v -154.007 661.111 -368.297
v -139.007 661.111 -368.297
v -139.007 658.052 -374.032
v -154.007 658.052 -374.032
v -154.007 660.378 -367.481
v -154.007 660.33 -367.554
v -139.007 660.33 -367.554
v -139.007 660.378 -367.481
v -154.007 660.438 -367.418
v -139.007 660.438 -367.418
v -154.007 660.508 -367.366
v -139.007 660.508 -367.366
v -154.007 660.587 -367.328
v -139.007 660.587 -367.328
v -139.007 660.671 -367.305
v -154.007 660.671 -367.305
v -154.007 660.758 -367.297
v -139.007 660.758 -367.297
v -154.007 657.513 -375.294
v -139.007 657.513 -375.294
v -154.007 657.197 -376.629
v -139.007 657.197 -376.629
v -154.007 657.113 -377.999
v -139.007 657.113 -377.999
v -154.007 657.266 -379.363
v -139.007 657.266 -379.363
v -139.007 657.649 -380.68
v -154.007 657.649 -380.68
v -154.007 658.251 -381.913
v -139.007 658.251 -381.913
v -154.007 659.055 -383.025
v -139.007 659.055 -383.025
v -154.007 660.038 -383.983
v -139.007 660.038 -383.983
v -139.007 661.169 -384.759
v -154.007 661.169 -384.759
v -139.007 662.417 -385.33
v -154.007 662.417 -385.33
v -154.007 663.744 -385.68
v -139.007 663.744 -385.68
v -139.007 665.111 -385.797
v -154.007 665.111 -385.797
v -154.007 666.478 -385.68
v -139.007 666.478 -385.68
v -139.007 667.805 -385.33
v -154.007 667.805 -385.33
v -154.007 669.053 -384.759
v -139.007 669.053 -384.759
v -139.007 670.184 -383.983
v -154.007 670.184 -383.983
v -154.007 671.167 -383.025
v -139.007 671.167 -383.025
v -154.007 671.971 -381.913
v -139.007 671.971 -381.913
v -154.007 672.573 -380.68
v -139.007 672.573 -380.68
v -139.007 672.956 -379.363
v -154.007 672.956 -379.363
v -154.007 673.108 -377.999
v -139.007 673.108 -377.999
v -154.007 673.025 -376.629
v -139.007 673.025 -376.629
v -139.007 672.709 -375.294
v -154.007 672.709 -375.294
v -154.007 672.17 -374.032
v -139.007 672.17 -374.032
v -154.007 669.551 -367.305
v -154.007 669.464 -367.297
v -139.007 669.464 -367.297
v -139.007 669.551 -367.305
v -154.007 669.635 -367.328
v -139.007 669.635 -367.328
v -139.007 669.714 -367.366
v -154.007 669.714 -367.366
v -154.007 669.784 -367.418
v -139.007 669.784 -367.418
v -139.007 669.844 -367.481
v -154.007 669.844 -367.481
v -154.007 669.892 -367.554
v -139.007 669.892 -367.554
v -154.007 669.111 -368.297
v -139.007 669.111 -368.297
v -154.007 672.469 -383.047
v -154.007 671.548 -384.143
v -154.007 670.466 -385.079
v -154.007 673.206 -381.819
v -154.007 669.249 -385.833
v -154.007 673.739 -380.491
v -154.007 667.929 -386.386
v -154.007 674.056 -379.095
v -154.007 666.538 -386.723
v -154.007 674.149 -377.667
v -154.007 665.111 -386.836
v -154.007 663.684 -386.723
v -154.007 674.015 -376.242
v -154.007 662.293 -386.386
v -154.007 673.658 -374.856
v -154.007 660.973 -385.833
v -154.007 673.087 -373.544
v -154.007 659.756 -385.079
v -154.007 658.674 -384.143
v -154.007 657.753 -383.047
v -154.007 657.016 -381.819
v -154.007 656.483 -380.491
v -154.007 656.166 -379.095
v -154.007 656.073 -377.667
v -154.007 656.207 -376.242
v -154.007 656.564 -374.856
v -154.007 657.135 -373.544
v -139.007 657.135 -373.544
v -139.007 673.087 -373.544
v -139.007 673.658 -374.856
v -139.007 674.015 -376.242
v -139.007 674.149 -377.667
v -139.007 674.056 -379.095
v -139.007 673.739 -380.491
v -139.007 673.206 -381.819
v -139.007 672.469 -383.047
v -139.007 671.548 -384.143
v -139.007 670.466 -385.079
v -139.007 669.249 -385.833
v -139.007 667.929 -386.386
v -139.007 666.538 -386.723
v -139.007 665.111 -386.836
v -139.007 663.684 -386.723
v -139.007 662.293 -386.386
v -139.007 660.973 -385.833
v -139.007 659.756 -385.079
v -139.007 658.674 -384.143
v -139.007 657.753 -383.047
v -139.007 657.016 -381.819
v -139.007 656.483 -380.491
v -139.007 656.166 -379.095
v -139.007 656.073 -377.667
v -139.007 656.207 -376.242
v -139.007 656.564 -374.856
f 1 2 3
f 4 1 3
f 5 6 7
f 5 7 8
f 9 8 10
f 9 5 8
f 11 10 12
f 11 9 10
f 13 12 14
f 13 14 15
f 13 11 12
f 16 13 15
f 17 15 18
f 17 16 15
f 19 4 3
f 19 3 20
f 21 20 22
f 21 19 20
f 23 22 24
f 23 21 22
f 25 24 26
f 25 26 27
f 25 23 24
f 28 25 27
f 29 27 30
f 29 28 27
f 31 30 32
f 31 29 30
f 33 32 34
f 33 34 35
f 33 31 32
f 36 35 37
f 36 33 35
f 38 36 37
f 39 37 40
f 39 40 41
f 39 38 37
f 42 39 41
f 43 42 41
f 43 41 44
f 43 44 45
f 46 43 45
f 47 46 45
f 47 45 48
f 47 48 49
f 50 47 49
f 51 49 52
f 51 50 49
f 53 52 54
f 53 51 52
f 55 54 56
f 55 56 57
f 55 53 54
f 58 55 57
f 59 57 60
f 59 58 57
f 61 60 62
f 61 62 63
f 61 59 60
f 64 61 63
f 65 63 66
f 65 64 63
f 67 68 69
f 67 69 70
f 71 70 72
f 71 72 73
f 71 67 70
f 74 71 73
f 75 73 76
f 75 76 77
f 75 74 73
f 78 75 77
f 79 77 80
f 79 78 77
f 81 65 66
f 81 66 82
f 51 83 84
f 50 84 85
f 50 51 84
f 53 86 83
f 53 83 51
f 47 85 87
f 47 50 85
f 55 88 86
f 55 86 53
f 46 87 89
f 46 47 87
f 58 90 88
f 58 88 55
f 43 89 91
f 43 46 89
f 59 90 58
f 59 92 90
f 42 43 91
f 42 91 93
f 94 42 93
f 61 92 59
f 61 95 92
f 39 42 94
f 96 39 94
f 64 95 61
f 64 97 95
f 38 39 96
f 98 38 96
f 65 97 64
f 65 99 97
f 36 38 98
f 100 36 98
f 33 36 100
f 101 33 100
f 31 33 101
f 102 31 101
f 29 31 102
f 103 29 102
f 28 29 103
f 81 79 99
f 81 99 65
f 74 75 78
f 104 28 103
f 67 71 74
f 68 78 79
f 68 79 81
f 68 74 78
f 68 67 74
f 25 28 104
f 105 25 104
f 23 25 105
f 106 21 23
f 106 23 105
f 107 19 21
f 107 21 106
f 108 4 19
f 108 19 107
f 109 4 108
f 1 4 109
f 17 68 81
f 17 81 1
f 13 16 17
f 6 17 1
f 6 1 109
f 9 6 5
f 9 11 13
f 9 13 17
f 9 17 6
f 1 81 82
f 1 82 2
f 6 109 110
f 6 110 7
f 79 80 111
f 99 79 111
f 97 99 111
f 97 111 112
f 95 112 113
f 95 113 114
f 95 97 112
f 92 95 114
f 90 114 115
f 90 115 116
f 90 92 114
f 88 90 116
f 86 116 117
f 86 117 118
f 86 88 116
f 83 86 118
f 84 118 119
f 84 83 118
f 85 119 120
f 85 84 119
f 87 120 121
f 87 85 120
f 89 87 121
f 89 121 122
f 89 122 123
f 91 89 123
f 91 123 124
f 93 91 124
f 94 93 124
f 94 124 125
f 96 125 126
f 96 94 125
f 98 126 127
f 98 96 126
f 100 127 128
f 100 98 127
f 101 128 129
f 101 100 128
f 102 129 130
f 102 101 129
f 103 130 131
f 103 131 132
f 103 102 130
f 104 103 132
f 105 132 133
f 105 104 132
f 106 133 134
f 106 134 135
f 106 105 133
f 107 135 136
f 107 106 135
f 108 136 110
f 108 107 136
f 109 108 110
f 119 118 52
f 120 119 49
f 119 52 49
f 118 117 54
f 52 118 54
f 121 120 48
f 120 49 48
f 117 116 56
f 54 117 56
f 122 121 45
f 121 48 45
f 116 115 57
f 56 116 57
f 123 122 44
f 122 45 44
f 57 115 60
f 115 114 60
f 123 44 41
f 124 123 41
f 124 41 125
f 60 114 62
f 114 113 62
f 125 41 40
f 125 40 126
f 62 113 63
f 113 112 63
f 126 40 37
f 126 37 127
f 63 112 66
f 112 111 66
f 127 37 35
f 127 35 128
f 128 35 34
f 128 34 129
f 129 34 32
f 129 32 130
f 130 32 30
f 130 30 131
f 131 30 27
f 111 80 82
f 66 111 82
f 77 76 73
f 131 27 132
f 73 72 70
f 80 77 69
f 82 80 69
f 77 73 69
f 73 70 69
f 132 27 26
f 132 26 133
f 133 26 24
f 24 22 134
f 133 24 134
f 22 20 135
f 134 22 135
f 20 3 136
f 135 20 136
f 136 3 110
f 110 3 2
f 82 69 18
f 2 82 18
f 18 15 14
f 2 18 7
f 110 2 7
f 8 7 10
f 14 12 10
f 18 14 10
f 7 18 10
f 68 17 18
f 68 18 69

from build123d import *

# Parameters (mm, degrees)
BOSS_EXTRUDE1_DEPTH = 15


with BuildPart() as part:
    # Sketch1 → Boss-Extrude1 (new body)
    with BuildSketch(Plane(origin=(-154.007123162, 0, 0), x_dir=(0, -1, 0), z_dir=(-1, 0, 0))):
        with BuildLine():
            Line((-657.135362842, -373.543546556), (-660.3297369, -367.554095198))
            ThreePointArc((-660.3297369, -367.554095198), (-660.508248633, -367.366340196), (-660.757920333, -367.297185139))
            Line((-660.757920333, -367.297185139), (-669.463950035, -367.297185139))
            ThreePointArc((-669.463950035, -367.297185139), (-669.713621735, -367.366340196), (-669.892133468, -367.554095198))
            Line((-669.892133468, -367.554095198), (-673.086507526, -373.543546556))
            ThreePointArc((-673.086507526, -373.543546556), (-665.110935184, -386.836167126), (-657.135362842, -373.543546556))
        make_face()
        with BuildLine():
            Line((-672.169758714, -374.032479256), (-669.110935184, -368.297185139))
            Line((-669.110935184, -368.297185139), (-661.110935184, -368.297185139))
            Line((-661.110935184, -368.297185139), (-658.052111655, -374.032479256))
            ThreePointArc((-658.052111655, -374.032479256), (-665.110935184, -385.797185139), (-672.169758714, -374.032479256))
        make_face(mode=Mode.SUBTRACT)
    extrude(amount=-BOSS_EXTRUDE1_DEPTH)


solid = part.part
